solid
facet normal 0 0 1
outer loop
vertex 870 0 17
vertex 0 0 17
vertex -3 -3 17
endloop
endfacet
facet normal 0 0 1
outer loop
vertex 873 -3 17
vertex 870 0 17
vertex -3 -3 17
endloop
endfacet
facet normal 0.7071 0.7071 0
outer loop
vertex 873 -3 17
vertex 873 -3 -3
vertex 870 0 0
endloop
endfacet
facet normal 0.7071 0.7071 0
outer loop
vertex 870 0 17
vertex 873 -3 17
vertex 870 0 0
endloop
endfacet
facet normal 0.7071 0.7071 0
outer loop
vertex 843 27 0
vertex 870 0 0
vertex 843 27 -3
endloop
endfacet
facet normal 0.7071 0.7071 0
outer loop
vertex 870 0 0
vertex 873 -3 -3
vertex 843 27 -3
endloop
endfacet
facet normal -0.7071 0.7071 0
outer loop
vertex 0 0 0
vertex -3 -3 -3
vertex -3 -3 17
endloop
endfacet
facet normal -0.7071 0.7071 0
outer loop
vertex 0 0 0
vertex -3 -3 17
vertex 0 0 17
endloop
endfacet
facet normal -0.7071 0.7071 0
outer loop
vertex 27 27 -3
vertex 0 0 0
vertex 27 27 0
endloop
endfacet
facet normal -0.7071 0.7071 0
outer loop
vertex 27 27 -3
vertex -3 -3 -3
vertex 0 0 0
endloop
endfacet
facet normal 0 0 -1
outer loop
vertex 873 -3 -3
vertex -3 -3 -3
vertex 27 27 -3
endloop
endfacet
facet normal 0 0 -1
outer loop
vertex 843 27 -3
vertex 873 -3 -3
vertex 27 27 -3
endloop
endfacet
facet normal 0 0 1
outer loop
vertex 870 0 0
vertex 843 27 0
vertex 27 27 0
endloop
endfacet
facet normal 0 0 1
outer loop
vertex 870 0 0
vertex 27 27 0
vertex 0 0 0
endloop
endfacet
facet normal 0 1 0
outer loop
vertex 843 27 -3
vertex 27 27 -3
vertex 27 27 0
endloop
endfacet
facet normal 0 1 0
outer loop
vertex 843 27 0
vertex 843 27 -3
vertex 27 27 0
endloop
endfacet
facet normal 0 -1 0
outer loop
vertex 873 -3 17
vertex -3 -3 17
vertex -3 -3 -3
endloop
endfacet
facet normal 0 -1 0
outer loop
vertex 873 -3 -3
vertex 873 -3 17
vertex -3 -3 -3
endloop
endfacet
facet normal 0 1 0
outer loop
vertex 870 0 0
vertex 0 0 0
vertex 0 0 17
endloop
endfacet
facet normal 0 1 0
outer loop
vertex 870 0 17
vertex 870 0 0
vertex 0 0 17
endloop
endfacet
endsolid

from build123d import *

# Parameters (mm, degrees)
BOX021_W               = 30
BOX021_H               = 100
BOX021_DEPTH           = 30
BOX021_PLACEMENT_ANGLE = 45
BOX020_W               = 30
BOX020_H               = 100
BOX020_DEPTH           = 30
BOX020_PLACEMENT_ANGLE = -45
PAD_DEPTH              = 876


with BuildPart() as cube006:
    # Box021 → Box021 (new body)
    with BuildSketch(Plane.XY):
        with Locations((15, 50)):
            Rectangle(BOX021_W, BOX021_H)
    extrude(amount=BOX021_DEPTH)


with BuildPart() as cube006_1:
    # Box021 placement: moved
    add(cube006.part.moved(Location((873, -3, -3))).rotate(Axis((873, -3, -3), (0, 0, 1)), BOX021_PLACEMENT_ANGLE))


with BuildPart() as cube:
    # Box020 → Box020 (new body)
    with BuildSketch(Plane.XY):
        with Locations((15, 50)):
            Rectangle(BOX020_W, BOX020_H)
    extrude(amount=BOX020_DEPTH)


with BuildPart() as cube_1:
    # Box020 placement: moved
    add(cube.part.moved(Location((-24.213203, 18.213203, -3))).rotate(Axis((-24.213203, 18.213203, -3), (0, 0, 1)), BOX020_PLACEMENT_ANGLE))


with BuildPart() as rahmen1:
    # Sketch → Pad (new body)
    with BuildSketch(Plane(origin=(-3, -3, -3), x_dir=(0, 1, 0), z_dir=(1, 0, 0))):
        Polygon((0, 0), (30, 0), (30, 3), (3, 3), (3, 20), (0, 20), align=None)
    extrude(amount=PAD_DEPTH)

    # Cut: cut Cube
    add(cube_1.part, mode=Mode.SUBTRACT)

    # Cut001: cut Cube006
    add(cube006_1.part, mode=Mode.SUBTRACT)


solid = rahmen1.part
